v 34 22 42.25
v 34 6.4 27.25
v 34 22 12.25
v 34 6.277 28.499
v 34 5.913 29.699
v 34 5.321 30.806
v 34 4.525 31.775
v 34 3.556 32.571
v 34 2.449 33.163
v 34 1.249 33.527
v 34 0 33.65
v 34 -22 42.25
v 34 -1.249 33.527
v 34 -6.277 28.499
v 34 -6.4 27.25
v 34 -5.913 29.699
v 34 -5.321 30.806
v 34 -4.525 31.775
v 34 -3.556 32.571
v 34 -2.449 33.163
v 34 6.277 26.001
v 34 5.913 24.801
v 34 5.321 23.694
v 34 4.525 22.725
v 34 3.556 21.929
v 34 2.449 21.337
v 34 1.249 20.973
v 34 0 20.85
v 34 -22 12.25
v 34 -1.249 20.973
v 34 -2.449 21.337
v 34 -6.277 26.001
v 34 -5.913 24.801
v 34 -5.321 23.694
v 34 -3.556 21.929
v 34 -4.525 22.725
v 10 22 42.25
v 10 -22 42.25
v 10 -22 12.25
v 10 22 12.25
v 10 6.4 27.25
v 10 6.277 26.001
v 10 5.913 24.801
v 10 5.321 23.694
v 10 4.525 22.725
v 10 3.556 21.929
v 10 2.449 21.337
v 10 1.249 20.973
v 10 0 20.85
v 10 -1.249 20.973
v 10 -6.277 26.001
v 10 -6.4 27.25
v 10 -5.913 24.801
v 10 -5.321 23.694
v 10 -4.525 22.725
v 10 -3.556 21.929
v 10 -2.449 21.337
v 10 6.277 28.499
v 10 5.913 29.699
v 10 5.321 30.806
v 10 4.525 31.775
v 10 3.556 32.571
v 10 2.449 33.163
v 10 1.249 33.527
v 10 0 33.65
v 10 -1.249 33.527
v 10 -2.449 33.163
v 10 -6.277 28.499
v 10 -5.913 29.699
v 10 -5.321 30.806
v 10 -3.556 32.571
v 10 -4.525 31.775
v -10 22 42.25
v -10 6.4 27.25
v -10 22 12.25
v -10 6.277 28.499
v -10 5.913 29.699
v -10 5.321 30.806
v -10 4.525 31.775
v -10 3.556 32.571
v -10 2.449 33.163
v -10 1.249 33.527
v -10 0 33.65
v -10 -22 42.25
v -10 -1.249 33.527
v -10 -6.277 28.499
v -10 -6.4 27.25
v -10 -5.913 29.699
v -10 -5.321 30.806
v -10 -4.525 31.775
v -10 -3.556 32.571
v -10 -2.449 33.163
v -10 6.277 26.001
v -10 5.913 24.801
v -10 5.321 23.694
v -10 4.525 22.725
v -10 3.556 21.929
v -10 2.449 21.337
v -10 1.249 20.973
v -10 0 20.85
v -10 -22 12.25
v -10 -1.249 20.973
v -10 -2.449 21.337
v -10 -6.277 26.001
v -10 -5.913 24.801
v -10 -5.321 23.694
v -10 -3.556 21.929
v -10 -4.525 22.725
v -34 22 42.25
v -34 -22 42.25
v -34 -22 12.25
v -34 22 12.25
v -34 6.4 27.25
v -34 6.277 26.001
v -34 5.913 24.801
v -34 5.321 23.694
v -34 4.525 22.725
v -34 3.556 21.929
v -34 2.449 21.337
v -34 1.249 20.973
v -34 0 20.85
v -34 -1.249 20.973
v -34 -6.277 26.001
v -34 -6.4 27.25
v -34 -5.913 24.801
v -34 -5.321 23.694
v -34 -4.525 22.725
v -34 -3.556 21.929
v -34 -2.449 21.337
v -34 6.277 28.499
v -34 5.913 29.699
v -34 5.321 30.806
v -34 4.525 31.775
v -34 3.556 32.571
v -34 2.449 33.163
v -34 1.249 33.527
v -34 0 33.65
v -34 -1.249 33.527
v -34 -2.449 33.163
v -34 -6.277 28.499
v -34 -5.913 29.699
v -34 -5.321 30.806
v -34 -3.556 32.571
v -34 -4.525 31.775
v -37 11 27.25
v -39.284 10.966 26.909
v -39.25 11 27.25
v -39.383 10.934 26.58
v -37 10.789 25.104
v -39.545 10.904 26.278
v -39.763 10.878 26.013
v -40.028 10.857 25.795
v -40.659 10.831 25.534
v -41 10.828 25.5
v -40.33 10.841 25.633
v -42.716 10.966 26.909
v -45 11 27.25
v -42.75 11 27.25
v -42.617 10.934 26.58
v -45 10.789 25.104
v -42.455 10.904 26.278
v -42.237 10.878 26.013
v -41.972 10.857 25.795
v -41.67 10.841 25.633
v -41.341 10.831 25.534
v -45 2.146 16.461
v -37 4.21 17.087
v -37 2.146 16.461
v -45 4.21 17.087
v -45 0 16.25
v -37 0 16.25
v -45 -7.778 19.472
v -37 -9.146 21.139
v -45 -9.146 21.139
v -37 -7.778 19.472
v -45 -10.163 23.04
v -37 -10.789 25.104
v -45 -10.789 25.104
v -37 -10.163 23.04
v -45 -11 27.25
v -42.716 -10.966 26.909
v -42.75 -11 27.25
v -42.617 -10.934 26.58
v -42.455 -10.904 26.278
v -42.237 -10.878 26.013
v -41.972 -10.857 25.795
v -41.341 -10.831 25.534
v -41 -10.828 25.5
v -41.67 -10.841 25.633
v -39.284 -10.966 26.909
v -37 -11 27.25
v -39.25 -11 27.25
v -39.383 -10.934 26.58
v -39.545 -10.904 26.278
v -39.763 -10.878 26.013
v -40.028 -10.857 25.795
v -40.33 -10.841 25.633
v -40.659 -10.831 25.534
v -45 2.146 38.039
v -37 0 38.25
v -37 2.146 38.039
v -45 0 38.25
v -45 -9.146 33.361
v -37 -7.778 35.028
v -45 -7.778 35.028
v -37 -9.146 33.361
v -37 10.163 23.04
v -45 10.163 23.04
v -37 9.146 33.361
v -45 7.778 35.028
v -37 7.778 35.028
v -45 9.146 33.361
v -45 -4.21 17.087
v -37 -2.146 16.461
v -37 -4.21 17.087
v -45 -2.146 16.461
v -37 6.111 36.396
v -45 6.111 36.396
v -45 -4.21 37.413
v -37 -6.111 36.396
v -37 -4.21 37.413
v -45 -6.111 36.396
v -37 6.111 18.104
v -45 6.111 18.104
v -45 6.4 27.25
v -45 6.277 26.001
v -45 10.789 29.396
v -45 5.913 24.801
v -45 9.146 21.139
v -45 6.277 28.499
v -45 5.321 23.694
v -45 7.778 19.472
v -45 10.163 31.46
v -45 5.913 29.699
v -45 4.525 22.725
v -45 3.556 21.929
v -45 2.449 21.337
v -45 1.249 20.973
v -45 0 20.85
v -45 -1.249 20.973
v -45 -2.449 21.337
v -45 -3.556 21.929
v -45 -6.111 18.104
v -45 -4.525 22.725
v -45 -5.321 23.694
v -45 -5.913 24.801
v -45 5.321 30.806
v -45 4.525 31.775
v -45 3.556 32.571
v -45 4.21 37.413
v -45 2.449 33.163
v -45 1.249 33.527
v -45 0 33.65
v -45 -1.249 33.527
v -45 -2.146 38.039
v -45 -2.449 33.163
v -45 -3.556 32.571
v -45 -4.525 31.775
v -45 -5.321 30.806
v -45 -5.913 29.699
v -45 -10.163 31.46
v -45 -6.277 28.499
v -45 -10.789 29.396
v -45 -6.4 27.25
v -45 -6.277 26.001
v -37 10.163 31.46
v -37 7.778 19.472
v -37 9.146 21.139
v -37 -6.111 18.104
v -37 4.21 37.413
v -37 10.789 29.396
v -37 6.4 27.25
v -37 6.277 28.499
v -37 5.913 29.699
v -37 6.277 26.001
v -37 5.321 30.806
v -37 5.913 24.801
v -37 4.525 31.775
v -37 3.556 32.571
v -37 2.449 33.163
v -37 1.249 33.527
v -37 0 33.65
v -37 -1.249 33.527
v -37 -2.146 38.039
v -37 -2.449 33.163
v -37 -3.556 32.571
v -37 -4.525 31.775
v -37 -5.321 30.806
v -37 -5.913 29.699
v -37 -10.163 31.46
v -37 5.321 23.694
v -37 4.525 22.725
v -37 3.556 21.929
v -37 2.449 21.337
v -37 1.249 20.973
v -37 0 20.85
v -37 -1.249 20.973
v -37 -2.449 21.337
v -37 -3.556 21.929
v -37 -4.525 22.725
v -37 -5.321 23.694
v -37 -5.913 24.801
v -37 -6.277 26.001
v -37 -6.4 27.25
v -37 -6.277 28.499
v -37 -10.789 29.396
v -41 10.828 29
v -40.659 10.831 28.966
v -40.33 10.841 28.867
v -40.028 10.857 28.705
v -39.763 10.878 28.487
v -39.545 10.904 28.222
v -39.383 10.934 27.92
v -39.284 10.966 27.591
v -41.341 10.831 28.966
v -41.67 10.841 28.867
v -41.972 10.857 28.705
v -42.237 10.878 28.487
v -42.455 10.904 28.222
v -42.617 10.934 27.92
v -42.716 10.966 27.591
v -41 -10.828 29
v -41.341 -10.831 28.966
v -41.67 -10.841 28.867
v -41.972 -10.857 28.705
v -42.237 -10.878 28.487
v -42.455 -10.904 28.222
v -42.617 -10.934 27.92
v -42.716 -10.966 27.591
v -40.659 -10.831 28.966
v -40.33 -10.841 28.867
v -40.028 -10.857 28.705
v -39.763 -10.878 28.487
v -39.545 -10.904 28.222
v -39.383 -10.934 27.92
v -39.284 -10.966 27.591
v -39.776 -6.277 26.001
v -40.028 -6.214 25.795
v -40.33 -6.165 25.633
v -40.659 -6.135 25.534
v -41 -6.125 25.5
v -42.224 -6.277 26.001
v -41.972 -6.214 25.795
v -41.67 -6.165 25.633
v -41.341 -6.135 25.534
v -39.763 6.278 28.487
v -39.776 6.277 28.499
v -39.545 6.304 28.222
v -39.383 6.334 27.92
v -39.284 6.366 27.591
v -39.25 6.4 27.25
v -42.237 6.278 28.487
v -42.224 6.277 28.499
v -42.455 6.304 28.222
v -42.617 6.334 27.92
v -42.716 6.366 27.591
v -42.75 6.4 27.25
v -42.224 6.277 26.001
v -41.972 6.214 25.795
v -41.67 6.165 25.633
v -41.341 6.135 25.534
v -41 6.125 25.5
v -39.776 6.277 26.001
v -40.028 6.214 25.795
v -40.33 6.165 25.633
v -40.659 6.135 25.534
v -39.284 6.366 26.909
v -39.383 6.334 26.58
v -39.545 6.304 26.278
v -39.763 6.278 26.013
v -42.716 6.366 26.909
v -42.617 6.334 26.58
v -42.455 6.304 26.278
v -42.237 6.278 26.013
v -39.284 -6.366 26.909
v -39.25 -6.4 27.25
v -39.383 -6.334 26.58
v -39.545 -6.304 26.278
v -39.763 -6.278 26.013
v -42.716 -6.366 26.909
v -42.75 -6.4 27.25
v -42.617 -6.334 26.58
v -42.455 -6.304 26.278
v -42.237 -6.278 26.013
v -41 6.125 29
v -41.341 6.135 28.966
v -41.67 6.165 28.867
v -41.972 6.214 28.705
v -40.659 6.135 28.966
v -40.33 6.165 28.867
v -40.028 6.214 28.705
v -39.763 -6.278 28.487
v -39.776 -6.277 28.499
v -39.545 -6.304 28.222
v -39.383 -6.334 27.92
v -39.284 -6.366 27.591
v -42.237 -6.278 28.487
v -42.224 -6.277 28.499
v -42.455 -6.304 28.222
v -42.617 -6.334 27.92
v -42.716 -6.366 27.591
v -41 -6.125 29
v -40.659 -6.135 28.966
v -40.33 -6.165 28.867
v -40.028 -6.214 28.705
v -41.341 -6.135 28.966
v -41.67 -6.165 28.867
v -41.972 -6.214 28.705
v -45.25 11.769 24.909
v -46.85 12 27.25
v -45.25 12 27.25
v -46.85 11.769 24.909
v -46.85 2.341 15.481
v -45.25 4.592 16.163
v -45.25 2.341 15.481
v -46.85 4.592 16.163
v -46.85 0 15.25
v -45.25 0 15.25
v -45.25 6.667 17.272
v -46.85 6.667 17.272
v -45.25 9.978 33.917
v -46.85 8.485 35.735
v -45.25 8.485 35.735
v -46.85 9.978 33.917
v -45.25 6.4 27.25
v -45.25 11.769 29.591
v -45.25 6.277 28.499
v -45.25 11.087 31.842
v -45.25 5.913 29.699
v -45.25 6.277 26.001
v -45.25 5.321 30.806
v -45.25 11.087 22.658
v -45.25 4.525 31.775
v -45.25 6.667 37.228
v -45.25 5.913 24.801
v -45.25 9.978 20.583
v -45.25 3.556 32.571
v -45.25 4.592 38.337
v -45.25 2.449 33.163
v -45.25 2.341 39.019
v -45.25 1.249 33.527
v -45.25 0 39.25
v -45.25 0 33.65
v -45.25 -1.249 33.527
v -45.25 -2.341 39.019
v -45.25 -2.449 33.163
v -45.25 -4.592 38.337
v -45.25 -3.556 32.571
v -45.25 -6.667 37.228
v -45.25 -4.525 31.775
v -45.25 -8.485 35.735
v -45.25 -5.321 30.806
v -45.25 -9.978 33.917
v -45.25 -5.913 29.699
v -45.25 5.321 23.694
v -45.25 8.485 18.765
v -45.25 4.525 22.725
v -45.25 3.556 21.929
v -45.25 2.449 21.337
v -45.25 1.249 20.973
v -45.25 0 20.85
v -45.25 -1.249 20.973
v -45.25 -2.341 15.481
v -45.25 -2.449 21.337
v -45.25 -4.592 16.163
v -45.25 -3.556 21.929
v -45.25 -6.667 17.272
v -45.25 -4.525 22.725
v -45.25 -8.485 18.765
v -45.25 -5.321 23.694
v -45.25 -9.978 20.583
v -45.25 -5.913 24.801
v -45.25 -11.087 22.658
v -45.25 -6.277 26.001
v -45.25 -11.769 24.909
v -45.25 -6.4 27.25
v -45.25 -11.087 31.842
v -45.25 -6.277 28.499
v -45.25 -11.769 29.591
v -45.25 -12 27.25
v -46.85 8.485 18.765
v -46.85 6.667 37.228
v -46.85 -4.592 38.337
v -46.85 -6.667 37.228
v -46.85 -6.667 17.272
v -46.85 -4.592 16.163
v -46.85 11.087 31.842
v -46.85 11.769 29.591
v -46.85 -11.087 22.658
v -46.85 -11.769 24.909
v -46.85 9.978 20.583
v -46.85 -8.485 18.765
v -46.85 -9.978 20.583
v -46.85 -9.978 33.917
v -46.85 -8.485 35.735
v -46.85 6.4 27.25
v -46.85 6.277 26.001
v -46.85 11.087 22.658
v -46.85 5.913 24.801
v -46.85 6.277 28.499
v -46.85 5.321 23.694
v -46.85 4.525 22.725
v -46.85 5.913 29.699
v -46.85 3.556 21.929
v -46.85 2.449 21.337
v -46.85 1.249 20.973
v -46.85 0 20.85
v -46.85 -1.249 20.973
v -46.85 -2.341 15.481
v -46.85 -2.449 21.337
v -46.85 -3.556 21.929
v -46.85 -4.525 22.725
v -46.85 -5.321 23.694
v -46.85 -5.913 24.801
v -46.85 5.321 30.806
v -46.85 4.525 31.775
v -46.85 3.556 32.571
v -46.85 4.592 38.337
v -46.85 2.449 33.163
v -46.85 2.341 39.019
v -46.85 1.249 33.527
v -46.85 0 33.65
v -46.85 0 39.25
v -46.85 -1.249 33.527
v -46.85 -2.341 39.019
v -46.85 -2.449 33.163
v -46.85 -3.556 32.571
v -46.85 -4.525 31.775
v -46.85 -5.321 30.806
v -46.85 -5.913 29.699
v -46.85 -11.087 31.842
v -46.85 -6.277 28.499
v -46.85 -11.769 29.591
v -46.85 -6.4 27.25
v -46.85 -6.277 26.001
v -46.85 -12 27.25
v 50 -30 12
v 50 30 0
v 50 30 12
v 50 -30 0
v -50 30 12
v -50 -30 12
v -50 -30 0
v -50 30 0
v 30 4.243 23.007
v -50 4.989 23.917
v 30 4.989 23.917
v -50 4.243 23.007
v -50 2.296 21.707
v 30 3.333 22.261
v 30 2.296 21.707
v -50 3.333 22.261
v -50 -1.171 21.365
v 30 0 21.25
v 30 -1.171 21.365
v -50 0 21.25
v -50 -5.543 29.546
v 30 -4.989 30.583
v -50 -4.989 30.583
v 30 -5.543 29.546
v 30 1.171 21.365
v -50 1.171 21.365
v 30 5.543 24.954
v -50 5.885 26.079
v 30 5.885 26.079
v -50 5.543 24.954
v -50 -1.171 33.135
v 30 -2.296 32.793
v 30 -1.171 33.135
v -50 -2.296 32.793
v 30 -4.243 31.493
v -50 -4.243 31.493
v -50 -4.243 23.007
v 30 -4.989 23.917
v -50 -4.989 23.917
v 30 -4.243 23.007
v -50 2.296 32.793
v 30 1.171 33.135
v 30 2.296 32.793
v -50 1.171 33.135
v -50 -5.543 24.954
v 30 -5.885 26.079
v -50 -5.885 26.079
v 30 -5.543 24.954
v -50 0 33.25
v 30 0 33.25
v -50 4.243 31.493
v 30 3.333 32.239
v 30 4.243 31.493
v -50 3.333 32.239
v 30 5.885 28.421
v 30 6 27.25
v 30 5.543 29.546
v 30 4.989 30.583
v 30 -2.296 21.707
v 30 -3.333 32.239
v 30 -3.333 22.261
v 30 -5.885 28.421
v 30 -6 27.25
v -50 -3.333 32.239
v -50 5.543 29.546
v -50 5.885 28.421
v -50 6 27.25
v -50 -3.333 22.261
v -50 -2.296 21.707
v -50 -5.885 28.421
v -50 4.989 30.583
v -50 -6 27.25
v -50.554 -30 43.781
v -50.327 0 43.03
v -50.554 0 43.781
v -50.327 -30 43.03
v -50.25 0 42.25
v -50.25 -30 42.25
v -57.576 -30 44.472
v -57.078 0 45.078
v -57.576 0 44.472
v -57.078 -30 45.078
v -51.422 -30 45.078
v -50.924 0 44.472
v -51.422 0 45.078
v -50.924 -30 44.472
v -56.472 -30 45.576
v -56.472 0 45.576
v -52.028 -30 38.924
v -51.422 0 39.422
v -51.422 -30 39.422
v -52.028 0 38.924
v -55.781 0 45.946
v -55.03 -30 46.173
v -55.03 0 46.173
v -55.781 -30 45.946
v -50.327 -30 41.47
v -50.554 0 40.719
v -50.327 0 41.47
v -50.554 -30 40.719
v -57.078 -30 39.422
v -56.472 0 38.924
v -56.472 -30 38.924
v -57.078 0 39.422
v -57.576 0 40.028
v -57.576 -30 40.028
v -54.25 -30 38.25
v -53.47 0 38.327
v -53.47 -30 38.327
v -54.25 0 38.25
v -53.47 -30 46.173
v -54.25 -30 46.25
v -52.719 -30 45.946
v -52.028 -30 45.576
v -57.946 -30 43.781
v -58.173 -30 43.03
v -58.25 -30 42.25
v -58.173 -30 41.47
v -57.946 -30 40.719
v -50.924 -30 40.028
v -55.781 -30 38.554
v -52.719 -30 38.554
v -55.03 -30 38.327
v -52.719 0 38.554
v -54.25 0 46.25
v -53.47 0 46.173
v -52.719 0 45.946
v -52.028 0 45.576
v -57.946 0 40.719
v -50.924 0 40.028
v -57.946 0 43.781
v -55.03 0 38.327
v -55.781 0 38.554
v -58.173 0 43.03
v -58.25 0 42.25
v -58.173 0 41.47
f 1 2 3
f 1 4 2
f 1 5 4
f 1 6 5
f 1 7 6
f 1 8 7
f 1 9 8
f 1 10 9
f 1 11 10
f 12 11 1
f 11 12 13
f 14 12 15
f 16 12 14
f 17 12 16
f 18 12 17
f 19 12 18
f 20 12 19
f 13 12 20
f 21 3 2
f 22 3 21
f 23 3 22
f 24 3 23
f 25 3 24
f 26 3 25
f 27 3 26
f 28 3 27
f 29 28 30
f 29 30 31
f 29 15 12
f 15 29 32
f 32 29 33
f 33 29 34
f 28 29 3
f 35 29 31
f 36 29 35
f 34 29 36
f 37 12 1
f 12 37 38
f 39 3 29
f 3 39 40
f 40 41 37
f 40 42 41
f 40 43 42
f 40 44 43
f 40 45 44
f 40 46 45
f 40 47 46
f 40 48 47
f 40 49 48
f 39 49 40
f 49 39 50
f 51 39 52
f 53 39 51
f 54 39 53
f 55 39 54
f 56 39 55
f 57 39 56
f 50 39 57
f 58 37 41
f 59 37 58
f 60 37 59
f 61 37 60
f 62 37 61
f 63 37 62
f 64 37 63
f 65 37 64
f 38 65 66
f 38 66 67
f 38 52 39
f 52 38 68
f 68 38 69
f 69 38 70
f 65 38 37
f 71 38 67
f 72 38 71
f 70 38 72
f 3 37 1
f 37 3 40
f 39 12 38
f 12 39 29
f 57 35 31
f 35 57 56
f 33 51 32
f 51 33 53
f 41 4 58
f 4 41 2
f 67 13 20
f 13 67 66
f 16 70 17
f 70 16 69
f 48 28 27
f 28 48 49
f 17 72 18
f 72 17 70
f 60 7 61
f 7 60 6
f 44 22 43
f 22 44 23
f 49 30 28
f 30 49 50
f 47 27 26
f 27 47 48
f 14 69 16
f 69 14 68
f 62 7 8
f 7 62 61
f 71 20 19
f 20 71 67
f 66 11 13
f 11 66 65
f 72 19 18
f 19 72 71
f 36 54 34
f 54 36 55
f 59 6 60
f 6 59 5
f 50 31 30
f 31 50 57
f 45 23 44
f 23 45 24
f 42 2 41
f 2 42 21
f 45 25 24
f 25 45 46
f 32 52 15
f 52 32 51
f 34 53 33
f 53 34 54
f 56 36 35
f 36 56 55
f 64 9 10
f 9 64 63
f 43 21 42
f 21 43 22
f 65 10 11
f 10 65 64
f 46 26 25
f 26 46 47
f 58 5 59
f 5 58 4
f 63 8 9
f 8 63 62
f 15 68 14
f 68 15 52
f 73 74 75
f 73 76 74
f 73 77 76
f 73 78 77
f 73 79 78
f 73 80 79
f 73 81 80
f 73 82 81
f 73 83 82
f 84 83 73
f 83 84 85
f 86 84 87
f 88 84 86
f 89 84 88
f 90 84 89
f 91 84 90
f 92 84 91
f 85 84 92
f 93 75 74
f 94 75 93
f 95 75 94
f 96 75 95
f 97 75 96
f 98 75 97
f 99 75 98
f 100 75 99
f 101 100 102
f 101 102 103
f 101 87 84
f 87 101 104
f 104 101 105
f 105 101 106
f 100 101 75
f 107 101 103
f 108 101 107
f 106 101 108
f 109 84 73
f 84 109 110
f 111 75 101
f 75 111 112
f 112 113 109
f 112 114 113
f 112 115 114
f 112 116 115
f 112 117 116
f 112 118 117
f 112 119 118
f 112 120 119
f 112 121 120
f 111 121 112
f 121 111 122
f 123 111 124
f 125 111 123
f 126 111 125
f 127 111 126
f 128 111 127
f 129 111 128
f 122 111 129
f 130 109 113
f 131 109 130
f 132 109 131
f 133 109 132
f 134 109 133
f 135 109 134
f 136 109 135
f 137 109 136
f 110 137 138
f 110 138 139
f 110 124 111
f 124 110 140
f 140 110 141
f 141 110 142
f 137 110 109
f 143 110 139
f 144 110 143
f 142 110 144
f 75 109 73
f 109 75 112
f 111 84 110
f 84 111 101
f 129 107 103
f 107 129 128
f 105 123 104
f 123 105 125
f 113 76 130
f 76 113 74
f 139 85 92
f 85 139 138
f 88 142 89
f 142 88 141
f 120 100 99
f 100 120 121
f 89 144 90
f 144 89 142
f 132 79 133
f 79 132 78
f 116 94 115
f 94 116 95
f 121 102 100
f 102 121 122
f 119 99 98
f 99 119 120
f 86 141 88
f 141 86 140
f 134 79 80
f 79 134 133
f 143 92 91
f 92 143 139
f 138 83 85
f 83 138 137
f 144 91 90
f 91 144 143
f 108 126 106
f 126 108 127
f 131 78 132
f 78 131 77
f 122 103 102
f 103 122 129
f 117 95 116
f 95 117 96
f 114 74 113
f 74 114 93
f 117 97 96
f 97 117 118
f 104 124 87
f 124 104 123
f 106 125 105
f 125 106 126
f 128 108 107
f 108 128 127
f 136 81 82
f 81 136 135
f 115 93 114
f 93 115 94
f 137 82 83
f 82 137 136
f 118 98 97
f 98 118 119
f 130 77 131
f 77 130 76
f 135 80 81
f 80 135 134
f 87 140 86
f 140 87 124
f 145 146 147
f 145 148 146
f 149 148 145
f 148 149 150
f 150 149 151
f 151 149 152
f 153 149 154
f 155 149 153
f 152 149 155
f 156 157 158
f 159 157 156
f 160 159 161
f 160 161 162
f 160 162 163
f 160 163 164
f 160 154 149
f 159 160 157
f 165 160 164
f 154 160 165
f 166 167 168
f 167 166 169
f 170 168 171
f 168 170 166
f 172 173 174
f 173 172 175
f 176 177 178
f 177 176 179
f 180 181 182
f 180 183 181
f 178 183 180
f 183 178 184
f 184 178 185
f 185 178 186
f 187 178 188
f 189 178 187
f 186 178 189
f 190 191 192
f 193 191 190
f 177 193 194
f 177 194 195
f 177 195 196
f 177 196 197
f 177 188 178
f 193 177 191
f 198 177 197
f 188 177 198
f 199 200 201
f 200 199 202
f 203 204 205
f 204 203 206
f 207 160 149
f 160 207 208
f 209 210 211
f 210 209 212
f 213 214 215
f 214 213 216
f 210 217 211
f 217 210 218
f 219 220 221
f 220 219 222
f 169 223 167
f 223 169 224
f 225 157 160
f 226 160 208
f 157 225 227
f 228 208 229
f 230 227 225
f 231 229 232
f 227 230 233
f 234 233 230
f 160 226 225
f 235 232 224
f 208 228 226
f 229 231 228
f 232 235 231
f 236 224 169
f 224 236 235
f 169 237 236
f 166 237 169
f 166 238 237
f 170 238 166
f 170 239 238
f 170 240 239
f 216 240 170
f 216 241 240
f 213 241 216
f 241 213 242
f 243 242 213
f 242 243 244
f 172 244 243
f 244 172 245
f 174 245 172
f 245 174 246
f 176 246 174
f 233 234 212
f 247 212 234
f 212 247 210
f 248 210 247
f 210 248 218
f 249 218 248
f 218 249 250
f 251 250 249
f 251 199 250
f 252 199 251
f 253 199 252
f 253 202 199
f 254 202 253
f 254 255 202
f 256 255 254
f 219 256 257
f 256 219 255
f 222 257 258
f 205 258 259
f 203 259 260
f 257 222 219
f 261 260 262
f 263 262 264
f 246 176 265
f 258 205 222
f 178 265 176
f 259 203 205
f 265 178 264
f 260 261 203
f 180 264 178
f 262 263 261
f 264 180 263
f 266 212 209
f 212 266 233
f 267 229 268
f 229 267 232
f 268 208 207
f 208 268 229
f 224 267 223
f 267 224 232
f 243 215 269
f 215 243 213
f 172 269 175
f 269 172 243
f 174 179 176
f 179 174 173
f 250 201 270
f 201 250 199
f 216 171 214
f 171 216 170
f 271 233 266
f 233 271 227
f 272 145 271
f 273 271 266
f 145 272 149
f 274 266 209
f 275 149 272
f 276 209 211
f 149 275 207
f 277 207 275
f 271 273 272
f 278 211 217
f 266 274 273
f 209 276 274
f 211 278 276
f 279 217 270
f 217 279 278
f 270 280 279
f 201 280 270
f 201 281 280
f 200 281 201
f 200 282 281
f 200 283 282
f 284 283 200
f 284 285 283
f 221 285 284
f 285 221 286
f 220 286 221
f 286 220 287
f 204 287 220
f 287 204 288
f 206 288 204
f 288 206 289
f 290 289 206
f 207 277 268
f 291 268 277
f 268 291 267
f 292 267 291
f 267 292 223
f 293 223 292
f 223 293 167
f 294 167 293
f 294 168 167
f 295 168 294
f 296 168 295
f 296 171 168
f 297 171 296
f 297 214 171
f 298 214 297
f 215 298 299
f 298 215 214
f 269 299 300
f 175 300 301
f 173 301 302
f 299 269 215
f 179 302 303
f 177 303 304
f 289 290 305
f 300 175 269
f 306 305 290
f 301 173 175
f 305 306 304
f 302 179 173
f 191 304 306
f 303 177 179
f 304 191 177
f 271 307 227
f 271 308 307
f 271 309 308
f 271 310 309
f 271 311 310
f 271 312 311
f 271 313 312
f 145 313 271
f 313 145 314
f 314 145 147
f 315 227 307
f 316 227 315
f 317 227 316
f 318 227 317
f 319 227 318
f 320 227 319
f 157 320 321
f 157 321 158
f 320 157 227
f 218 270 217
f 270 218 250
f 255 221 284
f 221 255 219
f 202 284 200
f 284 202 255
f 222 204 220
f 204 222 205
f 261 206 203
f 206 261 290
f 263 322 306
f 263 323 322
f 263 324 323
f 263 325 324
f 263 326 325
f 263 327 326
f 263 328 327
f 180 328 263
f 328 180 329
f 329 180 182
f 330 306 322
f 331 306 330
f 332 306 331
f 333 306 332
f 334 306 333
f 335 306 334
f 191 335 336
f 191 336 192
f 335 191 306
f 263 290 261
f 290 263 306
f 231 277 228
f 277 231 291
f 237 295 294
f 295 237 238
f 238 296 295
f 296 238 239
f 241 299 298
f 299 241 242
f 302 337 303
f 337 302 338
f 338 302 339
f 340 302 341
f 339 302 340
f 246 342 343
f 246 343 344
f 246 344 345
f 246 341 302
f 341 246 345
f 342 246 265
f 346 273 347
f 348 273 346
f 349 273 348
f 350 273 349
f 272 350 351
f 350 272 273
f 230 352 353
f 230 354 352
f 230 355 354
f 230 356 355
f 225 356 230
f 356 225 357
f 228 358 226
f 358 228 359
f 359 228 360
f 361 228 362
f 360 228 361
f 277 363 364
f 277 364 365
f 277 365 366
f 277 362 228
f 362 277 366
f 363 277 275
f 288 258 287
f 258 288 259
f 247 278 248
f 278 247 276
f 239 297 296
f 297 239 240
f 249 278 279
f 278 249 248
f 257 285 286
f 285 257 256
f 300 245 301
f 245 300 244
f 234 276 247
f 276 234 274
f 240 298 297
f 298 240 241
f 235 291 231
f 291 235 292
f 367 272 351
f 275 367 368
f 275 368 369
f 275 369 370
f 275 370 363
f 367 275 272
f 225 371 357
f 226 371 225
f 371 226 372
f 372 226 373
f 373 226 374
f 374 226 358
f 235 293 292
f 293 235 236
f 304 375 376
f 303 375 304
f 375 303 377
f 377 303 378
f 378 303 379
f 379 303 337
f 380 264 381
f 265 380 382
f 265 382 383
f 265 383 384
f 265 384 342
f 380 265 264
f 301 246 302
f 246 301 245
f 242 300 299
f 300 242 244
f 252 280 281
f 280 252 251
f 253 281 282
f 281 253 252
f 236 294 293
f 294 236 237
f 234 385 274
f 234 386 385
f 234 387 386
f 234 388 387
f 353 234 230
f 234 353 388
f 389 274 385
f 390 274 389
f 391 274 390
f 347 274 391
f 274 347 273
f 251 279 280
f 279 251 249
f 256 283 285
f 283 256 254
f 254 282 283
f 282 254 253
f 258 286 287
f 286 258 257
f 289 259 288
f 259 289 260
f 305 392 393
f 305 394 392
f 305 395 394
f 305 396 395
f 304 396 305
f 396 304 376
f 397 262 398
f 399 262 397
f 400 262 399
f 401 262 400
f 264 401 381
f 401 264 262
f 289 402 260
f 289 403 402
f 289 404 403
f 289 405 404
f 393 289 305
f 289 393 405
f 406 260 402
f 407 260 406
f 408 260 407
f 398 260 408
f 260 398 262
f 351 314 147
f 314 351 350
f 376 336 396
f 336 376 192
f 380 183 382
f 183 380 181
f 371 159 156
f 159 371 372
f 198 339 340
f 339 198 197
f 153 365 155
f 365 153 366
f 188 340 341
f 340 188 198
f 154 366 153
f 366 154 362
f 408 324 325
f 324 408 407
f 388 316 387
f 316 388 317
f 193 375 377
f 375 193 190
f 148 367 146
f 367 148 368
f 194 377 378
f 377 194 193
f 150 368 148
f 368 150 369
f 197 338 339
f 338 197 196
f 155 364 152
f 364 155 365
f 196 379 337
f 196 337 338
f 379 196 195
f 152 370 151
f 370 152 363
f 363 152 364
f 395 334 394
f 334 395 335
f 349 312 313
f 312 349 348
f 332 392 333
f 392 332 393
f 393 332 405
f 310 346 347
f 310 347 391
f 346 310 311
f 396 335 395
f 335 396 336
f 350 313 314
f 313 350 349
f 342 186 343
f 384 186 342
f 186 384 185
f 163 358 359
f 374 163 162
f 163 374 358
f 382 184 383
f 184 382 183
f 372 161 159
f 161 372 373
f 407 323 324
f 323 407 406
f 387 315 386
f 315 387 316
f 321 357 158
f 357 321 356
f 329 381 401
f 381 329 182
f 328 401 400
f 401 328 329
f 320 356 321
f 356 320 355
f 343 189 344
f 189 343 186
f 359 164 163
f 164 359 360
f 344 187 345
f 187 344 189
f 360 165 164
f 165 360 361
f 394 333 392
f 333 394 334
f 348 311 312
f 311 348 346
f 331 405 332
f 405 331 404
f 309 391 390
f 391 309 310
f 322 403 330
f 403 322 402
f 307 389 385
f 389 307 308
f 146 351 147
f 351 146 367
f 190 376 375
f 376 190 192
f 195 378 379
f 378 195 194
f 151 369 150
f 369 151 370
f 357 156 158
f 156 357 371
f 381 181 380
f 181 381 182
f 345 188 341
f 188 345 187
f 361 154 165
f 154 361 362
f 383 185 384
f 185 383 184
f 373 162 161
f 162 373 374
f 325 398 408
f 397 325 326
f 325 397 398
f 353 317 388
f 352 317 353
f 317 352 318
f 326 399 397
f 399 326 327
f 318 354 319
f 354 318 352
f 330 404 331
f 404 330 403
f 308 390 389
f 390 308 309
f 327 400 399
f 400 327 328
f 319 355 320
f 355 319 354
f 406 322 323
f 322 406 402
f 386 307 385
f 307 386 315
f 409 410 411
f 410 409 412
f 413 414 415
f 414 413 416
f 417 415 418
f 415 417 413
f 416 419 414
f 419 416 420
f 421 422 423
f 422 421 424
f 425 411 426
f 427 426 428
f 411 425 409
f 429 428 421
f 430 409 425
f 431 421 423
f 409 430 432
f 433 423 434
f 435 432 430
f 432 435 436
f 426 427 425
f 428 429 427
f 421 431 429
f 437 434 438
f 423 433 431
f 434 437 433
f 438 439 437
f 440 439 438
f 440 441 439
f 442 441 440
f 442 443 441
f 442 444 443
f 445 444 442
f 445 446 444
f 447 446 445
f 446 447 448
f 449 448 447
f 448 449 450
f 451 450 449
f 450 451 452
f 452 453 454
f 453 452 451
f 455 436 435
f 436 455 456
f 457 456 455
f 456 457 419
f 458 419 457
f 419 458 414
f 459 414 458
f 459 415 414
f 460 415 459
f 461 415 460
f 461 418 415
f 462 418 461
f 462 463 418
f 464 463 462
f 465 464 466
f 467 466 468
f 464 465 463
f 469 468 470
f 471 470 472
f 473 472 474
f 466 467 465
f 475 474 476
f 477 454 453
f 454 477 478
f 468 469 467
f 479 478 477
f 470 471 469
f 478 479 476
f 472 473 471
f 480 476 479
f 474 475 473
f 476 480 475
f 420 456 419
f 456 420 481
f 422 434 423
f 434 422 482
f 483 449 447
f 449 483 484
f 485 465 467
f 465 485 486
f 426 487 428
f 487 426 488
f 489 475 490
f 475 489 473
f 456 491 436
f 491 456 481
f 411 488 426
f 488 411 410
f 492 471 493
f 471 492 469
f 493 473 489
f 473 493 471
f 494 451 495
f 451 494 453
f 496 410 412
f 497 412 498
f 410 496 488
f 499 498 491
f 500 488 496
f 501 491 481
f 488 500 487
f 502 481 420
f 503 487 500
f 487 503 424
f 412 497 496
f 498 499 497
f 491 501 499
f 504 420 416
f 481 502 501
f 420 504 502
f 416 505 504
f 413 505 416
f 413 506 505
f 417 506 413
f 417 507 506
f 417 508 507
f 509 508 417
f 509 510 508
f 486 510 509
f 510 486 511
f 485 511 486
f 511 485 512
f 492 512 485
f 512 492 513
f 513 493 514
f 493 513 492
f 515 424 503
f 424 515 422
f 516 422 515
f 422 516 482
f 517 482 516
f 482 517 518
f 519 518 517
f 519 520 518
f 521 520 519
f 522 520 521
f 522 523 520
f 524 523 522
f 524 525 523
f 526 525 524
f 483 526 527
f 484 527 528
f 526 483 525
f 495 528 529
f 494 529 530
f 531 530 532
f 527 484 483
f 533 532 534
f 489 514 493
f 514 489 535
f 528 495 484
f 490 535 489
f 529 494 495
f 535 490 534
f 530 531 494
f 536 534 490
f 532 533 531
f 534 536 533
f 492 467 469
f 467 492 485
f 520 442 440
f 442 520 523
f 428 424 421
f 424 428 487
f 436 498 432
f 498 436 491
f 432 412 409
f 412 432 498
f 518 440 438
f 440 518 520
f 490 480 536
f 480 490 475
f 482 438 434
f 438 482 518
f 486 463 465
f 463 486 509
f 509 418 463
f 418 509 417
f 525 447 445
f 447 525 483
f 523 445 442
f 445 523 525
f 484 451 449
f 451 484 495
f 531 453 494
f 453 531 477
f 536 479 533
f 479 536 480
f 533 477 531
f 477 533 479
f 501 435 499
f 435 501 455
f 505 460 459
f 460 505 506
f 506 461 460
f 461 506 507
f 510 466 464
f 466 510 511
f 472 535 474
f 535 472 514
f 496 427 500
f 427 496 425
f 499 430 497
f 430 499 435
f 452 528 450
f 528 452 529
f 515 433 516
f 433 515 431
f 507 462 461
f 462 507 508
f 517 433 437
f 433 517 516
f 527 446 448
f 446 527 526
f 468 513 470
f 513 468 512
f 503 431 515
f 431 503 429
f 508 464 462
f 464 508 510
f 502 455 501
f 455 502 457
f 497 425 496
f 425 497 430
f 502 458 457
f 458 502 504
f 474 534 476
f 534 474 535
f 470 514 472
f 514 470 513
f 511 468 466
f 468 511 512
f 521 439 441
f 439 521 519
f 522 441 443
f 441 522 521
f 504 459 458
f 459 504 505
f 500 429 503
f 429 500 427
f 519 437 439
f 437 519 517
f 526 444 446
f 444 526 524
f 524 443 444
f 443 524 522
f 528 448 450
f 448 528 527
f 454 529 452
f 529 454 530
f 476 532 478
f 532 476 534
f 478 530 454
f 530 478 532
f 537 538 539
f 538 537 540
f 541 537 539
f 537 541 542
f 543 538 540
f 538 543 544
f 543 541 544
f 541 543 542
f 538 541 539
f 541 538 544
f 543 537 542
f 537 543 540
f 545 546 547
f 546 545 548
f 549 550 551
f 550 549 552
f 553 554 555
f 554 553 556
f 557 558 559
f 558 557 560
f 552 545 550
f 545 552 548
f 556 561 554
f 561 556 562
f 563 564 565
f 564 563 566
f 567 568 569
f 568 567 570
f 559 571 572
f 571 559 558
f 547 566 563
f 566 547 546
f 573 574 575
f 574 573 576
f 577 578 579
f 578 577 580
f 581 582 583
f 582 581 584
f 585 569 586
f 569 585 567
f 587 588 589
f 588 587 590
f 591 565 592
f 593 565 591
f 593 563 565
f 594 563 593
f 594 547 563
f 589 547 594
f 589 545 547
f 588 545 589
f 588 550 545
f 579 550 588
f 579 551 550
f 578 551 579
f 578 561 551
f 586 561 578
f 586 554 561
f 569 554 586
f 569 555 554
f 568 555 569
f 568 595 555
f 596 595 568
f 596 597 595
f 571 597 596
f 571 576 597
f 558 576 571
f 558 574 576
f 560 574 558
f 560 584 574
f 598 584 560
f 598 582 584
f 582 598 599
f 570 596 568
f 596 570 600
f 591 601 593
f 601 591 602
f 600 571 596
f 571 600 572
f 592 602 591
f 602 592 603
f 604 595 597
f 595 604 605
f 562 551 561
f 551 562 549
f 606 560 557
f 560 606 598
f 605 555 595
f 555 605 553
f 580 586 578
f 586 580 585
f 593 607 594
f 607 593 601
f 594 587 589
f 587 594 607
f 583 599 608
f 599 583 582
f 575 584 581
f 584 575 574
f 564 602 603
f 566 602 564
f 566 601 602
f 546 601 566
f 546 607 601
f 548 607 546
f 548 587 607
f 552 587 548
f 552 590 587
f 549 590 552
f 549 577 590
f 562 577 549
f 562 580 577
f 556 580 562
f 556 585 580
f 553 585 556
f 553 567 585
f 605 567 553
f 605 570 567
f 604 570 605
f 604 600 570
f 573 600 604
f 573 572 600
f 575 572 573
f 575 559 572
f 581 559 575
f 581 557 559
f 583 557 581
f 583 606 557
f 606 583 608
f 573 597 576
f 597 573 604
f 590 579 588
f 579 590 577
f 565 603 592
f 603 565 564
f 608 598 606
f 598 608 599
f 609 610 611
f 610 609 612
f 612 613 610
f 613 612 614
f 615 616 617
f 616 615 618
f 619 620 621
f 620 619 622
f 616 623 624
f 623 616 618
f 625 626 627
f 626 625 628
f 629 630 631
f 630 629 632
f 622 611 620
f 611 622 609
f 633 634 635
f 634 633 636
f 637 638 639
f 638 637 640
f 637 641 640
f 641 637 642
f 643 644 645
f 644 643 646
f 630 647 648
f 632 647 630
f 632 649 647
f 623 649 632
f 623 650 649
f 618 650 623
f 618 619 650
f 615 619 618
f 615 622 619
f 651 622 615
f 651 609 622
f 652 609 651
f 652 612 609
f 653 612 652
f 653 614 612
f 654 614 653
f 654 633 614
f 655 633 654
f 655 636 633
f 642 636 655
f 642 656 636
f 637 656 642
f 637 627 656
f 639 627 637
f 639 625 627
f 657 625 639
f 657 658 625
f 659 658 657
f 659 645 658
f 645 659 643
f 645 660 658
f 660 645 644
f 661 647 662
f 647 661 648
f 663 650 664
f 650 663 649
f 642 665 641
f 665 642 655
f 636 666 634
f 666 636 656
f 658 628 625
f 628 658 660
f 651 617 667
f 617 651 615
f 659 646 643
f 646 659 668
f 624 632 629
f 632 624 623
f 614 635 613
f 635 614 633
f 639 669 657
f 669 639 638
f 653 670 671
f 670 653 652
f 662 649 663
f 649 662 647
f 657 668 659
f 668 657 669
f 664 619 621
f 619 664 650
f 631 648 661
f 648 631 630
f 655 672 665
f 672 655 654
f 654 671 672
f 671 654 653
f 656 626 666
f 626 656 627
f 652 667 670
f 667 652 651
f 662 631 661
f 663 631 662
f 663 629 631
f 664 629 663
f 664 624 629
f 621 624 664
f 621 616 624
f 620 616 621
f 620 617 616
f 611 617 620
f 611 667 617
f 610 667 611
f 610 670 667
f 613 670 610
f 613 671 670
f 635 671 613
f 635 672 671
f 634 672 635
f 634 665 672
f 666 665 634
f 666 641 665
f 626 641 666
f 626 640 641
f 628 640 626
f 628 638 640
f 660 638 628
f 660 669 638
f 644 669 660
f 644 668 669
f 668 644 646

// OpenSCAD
$fn = 32;

// ------------------------------------------------------------------------
// Machine vise: screw d12, jaws 24 x 30 mm
// Every part is its own module, assembly() places every instance.
// ------------------------------------------------------------------------

// --- part 1 ---
module vise_bed() {
  difference() {
    translate([-50, -30, 0]) cube([100, 60, 12]);
  }
}

// --- part 2 ---
module vise_jaw() {
  difference() {
    translate([-12, -22, 0]) cube([24, 44, 30]);
    translate([0, 0, 15]) rotate([0, 90, 0]) cylinder(h = 26, d = 12.8, center = true);
  }
}

// --- part 3 ---
module vise_screw() {
  translate([0, 0, -40]) cylinder(h = 80, d = 12);
}

// --- part 4 ---
module screw_collar() {
  difference() {
    cylinder(h = 8, d = 22);
    translate([0, 0, -1]) cylinder(h = 10, d = 12.8);
    translate([0, 0, 4]) rotate([90, 0, 0]) cylinder(h = 24, d = 3.5, center = true);
  }
}

// --- part 5 ---
module screw_washer() {
  difference() {
      translate([0, 0, 0]) cylinder(h = 1.6, d = 24);
      translate([0, 0, -1]) cylinder(h = 3.6, d = 12.8);
    }
}

// --- part 6 ---
module vise_handle() {
  cylinder(h = 30, d = 8);
}

// --- assembly ---
module assembly() {
  color([0.80, 0.24, 0.20]) translate([0, 0, 0]) rotate([0, 0, 0]) vise_bed();
  color([0.20, 0.45, 0.75]) translate([22, 0, 12.25]) rotate([0, 0, 0]) vise_jaw();
  color([0.25, 0.62, 0.32]) translate([-22, 0, 12.25]) rotate([0, 0, 0]) vise_jaw();
  color([0.92, 0.70, 0.18]) translate([-10, 0, 27.25]) rotate([0, 90, 0]) vise_screw();
  color([0.58, 0.35, 0.70]) translate([-45, 0, 27.25]) rotate([0, 90, 0]) screw_collar();
  color([0.16, 0.66, 0.66]) translate([-46.85, 0, 27.25]) rotate([0, 90, 0]) screw_washer();
  color([0.85, 0.48, 0.18]) translate([-54.25, 0, 42.25]) rotate([90, 0, 0]) vise_handle();
}

assembly();
